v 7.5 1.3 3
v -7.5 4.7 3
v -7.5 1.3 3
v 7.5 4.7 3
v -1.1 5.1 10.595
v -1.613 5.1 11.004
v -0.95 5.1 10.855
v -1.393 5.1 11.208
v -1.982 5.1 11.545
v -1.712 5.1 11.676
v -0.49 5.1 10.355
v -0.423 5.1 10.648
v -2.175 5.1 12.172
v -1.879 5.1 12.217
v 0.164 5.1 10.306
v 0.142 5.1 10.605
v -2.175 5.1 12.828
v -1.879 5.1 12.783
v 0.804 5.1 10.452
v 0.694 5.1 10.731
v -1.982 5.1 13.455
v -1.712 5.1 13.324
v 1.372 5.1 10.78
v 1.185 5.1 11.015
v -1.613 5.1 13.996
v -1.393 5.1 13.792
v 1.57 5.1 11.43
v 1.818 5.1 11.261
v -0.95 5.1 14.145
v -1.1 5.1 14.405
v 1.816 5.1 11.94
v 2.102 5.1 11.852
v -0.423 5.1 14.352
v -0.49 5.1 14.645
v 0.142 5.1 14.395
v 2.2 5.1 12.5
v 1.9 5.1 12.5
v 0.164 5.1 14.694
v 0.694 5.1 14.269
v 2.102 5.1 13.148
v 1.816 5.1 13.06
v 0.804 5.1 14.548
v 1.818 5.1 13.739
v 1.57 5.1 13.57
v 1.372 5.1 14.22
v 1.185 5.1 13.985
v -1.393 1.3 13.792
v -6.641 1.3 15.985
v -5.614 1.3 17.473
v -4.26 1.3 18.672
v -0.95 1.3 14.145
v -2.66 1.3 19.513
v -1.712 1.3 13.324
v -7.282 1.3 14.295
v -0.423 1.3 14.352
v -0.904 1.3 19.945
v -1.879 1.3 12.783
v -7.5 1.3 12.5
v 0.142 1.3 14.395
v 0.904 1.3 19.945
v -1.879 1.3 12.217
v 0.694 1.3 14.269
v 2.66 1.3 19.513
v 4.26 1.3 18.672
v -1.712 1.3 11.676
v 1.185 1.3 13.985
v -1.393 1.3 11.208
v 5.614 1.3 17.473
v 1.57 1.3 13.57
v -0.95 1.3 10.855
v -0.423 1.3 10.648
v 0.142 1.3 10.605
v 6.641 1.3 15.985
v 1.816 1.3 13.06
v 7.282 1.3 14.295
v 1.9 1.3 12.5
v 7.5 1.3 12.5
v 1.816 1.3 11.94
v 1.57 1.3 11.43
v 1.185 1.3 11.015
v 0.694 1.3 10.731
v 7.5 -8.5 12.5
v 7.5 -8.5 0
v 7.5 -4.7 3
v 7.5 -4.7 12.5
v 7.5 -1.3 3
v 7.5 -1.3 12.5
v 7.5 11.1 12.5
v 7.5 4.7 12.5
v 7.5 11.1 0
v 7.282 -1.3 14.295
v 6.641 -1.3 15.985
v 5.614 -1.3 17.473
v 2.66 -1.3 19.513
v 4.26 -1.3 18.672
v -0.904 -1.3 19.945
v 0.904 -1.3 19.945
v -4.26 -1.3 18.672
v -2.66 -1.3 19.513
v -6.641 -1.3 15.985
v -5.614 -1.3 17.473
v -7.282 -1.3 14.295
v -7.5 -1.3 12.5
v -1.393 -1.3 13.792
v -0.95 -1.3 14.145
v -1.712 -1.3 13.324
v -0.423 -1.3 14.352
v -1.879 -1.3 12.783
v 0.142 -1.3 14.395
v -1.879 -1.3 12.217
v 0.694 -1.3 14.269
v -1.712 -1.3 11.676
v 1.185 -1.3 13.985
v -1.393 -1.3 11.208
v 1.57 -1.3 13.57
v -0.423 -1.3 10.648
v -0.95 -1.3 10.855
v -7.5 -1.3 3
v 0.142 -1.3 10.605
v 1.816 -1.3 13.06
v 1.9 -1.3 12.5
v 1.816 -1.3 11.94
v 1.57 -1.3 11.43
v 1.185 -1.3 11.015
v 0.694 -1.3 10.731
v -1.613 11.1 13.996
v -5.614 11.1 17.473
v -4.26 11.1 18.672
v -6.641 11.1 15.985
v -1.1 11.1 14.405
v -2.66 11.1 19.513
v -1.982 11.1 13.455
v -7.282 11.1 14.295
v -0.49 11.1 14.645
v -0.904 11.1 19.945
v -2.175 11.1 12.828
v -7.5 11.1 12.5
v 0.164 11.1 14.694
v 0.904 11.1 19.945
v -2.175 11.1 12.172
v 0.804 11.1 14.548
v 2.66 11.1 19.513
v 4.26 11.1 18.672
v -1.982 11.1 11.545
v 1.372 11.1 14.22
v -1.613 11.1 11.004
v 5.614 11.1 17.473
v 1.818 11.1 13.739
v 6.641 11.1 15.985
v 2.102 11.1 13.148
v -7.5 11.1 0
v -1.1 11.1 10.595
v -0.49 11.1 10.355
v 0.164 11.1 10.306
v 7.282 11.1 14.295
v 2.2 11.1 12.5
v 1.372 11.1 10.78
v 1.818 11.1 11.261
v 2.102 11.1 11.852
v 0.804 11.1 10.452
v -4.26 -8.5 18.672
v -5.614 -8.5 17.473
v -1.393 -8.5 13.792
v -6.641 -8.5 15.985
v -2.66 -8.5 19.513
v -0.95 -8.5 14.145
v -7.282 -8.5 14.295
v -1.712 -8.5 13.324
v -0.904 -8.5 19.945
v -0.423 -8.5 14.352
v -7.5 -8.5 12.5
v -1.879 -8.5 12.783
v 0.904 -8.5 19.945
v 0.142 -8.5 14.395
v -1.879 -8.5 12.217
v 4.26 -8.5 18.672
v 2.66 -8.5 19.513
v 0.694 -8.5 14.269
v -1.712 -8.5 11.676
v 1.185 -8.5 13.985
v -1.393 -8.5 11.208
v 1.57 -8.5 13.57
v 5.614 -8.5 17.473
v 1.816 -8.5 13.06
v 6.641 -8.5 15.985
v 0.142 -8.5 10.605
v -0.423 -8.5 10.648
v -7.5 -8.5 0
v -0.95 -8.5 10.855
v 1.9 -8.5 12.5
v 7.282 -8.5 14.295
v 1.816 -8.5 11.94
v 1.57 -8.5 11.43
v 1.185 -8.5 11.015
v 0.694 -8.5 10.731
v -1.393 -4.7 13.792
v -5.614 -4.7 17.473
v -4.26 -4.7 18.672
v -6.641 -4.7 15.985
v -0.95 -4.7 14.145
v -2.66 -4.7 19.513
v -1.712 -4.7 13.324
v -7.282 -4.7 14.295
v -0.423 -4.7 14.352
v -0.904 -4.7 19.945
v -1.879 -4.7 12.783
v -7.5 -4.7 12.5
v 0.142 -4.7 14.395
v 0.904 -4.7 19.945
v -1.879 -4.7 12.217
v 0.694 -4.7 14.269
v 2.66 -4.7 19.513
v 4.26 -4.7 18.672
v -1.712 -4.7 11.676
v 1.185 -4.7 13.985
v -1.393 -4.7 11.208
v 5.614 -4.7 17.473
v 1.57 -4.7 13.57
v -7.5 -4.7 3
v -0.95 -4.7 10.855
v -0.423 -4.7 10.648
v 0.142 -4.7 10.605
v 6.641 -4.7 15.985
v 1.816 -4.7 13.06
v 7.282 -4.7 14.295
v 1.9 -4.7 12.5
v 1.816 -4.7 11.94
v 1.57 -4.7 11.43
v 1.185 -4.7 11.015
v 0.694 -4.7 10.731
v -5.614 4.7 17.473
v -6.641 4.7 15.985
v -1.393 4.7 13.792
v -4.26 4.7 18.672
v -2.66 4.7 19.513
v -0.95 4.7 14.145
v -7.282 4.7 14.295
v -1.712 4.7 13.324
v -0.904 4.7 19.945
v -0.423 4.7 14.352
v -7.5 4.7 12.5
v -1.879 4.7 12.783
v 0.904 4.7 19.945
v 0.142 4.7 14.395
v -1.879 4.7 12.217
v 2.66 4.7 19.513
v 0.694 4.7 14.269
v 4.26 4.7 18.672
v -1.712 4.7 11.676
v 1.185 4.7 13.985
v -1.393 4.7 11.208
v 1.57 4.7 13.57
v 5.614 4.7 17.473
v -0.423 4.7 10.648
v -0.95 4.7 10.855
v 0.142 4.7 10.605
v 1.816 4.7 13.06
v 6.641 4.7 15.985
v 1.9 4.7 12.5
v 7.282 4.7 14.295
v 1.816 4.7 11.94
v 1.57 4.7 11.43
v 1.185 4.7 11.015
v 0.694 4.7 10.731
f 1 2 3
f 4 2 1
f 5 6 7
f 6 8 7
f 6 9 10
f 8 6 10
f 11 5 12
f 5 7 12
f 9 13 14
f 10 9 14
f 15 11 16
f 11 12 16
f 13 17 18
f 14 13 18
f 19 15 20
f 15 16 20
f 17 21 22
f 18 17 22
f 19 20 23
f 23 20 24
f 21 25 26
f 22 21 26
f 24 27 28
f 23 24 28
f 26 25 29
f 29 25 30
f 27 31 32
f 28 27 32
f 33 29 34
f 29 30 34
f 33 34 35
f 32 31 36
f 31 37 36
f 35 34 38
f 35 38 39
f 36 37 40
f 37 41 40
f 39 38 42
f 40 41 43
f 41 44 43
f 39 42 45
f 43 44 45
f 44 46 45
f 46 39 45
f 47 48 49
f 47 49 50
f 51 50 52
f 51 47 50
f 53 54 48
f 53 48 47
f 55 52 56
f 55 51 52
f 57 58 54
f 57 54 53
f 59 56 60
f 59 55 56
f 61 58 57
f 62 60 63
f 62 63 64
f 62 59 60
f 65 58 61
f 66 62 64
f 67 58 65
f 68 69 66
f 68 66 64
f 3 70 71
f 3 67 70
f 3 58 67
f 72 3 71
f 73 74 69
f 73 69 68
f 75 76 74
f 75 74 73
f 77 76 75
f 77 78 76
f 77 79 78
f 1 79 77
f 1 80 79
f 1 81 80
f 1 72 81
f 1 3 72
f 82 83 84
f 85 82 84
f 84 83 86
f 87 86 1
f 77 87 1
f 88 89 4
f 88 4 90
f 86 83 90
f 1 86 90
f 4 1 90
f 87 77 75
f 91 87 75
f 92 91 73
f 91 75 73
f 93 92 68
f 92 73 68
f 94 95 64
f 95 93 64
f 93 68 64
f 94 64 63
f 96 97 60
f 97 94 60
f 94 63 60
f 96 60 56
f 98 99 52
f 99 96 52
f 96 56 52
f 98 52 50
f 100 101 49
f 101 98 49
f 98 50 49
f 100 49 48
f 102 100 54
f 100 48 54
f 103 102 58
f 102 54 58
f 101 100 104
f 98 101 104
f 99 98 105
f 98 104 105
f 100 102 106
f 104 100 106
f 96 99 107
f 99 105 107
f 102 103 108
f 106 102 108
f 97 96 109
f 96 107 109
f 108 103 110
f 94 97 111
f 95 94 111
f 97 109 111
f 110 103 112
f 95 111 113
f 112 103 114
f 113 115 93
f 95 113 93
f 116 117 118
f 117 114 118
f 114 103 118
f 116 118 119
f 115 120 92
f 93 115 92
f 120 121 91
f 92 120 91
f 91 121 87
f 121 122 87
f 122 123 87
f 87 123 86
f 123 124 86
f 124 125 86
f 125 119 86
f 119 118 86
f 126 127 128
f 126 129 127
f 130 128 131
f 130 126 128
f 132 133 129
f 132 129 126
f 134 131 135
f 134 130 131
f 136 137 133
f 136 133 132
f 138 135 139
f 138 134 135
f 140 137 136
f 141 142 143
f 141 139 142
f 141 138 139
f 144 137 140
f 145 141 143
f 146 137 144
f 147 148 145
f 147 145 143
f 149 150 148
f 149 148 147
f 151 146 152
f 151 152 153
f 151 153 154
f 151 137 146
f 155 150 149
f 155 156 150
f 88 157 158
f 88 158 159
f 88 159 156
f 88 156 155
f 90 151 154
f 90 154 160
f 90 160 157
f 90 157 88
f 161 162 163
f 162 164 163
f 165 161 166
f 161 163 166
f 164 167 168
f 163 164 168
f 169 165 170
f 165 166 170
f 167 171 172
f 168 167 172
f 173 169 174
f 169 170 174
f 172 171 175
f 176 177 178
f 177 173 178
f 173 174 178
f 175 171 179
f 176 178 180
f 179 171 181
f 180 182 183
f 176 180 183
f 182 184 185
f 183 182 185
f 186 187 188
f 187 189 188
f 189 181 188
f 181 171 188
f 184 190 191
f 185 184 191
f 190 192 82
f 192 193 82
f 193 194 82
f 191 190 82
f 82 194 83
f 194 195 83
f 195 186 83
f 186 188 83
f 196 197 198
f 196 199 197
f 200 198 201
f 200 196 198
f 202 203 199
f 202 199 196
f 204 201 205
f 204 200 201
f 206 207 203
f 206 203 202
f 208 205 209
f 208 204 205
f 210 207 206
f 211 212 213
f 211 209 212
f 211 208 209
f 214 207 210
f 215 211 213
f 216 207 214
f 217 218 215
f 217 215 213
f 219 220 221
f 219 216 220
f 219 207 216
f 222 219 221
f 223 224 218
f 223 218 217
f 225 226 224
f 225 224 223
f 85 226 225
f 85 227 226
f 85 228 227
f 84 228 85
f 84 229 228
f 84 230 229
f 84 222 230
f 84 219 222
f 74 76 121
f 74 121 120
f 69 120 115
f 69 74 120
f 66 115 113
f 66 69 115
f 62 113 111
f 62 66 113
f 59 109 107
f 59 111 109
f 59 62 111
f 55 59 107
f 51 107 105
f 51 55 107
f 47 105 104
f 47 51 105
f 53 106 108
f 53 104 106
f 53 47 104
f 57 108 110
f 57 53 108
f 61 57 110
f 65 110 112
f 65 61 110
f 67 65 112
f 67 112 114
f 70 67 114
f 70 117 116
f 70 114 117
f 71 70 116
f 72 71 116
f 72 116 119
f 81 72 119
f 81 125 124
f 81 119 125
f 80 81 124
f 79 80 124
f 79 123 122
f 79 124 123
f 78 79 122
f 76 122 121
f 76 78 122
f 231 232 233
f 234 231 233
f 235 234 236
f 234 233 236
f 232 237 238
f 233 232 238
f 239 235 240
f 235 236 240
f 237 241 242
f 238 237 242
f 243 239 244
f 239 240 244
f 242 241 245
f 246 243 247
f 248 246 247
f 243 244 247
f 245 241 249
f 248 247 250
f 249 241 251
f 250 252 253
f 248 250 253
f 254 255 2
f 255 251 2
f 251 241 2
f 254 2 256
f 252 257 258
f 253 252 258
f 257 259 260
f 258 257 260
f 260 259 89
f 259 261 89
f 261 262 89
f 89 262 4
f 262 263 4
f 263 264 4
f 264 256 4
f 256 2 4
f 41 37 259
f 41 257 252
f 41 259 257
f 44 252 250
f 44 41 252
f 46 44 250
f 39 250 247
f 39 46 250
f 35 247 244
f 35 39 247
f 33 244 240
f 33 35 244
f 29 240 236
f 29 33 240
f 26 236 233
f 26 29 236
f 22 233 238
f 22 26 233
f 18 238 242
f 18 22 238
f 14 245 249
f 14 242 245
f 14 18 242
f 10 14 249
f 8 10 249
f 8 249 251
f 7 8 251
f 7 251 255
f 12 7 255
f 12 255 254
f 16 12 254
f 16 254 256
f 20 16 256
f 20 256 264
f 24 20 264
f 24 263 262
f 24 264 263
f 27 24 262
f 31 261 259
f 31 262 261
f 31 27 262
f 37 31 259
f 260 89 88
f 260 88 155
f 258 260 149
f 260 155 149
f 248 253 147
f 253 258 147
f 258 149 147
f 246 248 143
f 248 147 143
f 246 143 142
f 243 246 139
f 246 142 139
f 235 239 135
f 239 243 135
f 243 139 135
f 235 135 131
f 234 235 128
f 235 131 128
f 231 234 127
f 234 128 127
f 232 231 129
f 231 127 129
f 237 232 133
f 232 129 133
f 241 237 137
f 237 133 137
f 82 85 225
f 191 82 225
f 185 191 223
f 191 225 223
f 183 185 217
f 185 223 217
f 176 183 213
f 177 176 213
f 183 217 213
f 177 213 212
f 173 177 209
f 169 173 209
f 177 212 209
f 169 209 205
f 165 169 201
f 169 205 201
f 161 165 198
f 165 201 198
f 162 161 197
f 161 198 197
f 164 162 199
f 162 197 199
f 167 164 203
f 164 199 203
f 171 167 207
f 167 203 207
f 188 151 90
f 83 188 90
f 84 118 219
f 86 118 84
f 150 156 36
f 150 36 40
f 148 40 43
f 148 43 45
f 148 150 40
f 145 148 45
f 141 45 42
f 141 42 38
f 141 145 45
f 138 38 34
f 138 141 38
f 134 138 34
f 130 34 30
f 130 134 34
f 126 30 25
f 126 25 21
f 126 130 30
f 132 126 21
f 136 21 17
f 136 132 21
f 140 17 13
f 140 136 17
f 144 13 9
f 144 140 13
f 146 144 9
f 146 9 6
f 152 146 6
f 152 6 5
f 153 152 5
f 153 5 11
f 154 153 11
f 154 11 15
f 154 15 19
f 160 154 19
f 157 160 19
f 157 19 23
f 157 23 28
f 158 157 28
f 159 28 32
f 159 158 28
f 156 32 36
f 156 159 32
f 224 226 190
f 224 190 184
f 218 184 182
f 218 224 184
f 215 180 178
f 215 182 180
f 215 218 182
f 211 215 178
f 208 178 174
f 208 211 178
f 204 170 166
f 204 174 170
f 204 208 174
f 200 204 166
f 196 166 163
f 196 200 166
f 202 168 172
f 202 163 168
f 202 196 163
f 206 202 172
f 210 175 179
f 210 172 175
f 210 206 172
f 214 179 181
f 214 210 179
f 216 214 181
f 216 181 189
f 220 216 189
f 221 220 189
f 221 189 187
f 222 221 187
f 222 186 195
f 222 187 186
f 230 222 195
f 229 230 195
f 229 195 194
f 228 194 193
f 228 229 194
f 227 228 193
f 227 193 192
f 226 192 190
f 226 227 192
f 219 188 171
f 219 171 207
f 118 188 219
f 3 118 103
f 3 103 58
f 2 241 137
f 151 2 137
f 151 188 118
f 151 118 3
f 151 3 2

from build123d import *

# Parameters (mm, degrees)
BOX003_W                  = 15
BOX003_H                  = 3.4
BOX003_DEPTH              = 17
ARRAY_Y_COUNT             = 2
ARRAY_Y_PITCH             = 6
CYLINDER002_R             = 2.2
CYLINDER002_DEPTH         = 6
CYLINDER001_R             = 1.9
CYLINDER001_DEPTH         = 15
FUSION001_PLACEMENT_ANGLE = 90
CYLINDER_R                = 7.5
CYLINDER_DEPTH            = 19.6
BOX002_W                  = 15
BOX002_H                  = 19.6
BOX002_DEPTH              = 12.5


with BuildPart() as side_3_extract_cube_array:
    # Box003 → Box003 (new body)
    with BuildSketch(Plane(origin=(-7.5, -7.7, 3), x_dir=(1, 0, 0), z_dir=(0, 0, 1))):
        with Locations((7.5, 1.7)):
            Rectangle(BOX003_W, BOX003_H)
    extrude(amount=BOX003_DEPTH)

    # Array Y: side 3 extract cube array ×2


with BuildPart() as side_3_extract_cube_array_1:
    add(side_3_extract_cube_array.part)
    with Locations(*[(0, i * ARRAY_Y_PITCH, 0) for i in range(1, ARRAY_Y_COUNT)]):
        add(side_3_extract_cube_array.part)


with BuildPart() as side_3_extract_cube_array_2:
    # Array placement: moved
    add(side_3_extract_cube_array_1.part.moved(Location((0, 3, 0))))


with BuildPart() as insert_hole:
    # Cylinder002 → Cylinder002 (new body)
    with BuildSketch(Plane.XY):
        Circle(CYLINDER002_R)
    extrude(amount=CYLINDER002_DEPTH)


with BuildPart() as side_3_extract_fusion:
    # Cylinder001 → Cylinder001 (new body)
    with BuildSketch(Plane.XY.offset(6)):
        Circle(CYLINDER001_R)
    extrude(amount=CYLINDER001_DEPTH)

    # Fusion001: union insert hole
    add(insert_hole.part)


with BuildPart() as side_3_extract_fusion_1:
    # Fusion001 placement: moved
    add(side_3_extract_fusion.part.moved(Location((0, 11.1, 12.5))).rotate(Axis((0, 11.1, 12.5), (1, 0, 0)), FUSION001_PLACEMENT_ANGLE))

    # Fusion002: union side 3 extract cube array
    add(side_3_extract_cube_array_2.part)


with BuildPart() as outer_cylinder:
    # Cylinder → Cylinder (new body)
    with BuildSketch(Plane(origin=(0, 11.1, 12.5), x_dir=(1, 0, 0), z_dir=(0, -1, 0))):
        Circle(CYLINDER_R)
    extrude(amount=CYLINDER_DEPTH)


with BuildPart() as side_3_cut_clone:
    # Box002 → Box002 (new body)
    with BuildSketch(Plane(origin=(-7.5, -8.5, 0), x_dir=(1, 0, 0), z_dir=(0, 0, 1))):
        with Locations((7.5, 9.8)):
            Rectangle(BOX002_W, BOX002_H)
    extrude(amount=BOX002_DEPTH)

    # Fusion: union outer cylinder
    add(outer_cylinder.part)

    # Cut: cut side 3 extract fusion
    add(side_3_extract_fusion_1.part, mode=Mode.SUBTRACT)


solid = side_3_cut_clone.part
